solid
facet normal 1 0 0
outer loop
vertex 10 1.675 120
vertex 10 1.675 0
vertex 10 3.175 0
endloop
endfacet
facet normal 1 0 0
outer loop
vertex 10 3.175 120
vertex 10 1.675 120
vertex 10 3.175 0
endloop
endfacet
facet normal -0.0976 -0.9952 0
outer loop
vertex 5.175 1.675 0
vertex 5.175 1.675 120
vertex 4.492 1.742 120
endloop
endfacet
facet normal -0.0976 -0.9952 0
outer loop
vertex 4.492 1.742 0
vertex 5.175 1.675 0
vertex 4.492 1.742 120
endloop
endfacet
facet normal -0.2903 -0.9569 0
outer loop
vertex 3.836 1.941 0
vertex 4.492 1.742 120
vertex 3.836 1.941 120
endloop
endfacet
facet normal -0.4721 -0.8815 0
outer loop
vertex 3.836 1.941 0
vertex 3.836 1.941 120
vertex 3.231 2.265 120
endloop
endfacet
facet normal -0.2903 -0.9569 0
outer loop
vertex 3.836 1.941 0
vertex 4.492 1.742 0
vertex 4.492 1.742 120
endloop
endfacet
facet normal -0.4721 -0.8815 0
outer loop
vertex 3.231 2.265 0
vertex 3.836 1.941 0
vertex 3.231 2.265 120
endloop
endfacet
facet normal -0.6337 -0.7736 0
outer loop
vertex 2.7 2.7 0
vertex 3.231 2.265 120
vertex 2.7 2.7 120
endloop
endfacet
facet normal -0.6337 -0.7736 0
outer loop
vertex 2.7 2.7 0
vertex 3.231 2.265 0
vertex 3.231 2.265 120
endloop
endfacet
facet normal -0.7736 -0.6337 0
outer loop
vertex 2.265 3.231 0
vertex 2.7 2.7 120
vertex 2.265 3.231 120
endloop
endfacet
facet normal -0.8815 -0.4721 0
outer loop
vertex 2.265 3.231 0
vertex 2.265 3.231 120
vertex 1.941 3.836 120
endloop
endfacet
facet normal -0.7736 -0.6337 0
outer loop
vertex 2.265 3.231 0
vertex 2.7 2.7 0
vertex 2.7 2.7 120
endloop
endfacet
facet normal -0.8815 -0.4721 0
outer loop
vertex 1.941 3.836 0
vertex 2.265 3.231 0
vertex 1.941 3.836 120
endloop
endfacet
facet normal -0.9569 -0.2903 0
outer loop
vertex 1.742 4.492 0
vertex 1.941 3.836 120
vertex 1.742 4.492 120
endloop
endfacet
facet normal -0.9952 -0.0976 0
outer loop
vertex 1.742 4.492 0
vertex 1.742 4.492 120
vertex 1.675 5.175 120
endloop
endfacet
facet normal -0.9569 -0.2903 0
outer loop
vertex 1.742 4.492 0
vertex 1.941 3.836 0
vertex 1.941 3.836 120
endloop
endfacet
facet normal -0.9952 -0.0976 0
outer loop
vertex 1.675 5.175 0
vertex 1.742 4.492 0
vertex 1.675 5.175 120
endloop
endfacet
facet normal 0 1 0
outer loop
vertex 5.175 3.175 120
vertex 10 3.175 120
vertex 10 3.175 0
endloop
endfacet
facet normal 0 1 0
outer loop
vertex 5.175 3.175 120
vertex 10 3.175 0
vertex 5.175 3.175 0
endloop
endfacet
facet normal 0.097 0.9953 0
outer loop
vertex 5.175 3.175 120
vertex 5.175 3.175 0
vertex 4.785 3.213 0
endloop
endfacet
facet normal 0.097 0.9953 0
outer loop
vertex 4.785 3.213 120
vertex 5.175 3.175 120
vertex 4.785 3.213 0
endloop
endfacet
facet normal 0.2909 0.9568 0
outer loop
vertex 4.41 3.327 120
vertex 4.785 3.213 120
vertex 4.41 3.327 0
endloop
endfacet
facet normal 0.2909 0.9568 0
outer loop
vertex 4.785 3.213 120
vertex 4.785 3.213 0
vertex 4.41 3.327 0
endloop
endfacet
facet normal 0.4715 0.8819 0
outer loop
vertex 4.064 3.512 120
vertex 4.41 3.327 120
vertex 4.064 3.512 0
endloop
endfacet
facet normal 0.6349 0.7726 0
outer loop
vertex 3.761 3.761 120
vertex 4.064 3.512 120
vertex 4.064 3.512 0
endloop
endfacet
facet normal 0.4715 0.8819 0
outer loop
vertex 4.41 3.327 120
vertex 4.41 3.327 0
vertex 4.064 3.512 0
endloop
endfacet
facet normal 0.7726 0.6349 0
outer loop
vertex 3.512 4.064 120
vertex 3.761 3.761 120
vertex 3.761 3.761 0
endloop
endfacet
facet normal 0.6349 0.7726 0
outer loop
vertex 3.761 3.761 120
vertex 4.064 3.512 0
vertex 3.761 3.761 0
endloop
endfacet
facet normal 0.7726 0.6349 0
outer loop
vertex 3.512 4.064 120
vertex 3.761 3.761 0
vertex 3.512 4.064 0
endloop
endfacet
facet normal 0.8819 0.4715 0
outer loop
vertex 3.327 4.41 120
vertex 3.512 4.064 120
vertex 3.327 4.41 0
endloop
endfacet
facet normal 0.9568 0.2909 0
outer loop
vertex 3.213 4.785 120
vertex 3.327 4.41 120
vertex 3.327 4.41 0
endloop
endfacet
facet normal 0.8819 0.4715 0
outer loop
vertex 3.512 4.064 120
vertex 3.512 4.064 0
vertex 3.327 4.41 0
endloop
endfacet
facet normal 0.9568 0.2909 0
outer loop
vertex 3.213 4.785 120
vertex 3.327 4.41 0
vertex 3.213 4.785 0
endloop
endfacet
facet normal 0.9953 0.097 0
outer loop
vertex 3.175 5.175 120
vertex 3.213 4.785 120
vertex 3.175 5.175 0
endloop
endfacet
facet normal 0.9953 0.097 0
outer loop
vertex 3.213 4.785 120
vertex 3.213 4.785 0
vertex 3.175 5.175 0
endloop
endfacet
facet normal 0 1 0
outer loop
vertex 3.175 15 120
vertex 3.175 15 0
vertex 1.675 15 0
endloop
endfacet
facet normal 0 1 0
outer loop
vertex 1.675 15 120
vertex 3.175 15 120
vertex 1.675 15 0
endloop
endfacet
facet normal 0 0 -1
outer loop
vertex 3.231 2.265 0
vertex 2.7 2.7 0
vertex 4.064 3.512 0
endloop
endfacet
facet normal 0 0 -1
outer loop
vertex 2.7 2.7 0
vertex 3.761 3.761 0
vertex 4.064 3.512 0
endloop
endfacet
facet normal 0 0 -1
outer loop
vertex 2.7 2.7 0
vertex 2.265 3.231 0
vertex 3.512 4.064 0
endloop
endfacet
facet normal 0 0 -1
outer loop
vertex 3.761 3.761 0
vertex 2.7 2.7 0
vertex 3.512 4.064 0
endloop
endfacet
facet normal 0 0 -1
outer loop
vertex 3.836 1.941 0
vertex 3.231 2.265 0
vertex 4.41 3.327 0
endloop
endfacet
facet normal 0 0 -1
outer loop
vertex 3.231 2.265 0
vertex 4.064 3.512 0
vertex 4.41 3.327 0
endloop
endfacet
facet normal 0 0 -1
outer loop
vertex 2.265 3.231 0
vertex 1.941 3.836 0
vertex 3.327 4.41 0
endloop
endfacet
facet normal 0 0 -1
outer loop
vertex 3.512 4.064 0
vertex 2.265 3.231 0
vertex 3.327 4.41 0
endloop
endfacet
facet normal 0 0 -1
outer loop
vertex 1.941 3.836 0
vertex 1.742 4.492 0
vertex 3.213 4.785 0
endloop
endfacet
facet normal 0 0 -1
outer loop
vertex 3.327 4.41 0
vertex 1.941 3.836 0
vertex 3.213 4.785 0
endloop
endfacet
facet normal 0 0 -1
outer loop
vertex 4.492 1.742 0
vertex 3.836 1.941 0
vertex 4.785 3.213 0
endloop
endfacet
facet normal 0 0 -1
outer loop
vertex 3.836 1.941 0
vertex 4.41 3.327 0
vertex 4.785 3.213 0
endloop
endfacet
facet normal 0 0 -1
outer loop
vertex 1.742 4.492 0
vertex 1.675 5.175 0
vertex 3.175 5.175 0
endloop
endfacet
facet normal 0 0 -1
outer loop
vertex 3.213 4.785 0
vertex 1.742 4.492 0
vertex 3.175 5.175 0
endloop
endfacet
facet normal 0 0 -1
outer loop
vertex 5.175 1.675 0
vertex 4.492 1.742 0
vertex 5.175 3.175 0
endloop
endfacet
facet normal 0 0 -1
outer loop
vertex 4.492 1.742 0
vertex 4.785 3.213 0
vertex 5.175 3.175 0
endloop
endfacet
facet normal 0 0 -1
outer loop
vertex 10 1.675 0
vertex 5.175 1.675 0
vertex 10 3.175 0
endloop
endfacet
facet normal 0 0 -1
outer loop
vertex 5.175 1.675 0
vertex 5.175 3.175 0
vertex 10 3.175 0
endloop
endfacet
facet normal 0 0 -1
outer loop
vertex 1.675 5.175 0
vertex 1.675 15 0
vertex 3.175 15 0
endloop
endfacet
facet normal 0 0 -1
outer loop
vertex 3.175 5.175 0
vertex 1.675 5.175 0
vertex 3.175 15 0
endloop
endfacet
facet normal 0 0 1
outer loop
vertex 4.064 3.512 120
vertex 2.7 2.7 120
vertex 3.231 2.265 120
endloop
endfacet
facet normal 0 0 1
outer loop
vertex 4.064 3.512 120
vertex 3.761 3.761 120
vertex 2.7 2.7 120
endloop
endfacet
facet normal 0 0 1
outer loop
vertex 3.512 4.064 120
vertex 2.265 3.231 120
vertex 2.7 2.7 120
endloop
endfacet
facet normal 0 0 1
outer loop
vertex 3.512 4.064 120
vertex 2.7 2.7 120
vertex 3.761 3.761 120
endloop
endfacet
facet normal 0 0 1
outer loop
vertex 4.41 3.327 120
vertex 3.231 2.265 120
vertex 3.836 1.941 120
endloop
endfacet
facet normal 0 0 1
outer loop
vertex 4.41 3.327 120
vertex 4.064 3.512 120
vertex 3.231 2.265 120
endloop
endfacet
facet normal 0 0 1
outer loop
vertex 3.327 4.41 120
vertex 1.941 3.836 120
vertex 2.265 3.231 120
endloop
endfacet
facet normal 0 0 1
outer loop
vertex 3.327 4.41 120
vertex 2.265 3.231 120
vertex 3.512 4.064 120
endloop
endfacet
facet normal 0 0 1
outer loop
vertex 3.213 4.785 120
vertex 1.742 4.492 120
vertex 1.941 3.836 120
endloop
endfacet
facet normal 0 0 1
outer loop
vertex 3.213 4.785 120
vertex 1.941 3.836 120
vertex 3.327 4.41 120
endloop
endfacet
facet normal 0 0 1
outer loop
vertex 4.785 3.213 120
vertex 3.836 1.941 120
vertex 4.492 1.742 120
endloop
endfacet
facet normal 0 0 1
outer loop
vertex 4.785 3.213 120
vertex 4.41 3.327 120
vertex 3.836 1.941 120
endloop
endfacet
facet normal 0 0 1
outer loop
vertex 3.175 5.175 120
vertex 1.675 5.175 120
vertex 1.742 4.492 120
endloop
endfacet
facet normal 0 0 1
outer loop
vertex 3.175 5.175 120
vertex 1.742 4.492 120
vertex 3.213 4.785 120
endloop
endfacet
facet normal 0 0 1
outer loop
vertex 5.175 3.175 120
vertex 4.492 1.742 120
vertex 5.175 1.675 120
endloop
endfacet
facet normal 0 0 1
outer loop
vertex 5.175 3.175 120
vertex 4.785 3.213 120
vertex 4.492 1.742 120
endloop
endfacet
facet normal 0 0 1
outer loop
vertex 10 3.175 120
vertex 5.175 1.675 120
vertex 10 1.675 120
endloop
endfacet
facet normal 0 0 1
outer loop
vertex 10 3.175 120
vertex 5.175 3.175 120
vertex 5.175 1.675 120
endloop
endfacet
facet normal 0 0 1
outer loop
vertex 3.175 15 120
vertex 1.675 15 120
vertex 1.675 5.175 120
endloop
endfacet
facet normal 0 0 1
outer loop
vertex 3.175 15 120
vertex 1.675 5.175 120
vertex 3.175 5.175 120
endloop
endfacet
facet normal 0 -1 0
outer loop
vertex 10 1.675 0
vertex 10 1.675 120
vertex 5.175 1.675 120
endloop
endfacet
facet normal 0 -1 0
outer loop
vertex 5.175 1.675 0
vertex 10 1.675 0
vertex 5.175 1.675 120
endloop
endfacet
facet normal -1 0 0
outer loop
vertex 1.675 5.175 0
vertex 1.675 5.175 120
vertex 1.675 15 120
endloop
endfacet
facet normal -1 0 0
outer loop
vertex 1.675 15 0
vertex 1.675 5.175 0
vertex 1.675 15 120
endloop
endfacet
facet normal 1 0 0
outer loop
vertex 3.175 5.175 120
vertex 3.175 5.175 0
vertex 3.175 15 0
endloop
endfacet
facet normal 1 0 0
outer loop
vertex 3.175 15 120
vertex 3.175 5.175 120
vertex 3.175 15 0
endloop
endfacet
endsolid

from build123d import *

# Parameters (mm, degrees)
BOSS_EXTRUDE1_DEPTH    = 120
CONVERT_SOLID1_DEPTH   = 120
CONVERT_SOLID1_2_DEPTH = 120


# Read off the part's stored shape, not the designer's step: Convert-Solid1
with BuildPart() as part:
    # Sketch1 → Boss-Extrude1 (new body)
    with BuildSketch(Plane.XY):
        Polygon((0, 15), (0, 0), (10, 0), (10, 3.175), (3.175, 3.175), (3.175, 15), align=None)
    extrude(amount=BOSS_EXTRUDE1_DEPTH)

    # Convert-Solid1 outline → Convert-Solid1 (cut)
    with BuildSketch(Plane.XY):
        with BuildLine():
            Line((1.675, 5.175), (1.675, 15))
            Line((1.675, 15), (0, 15))
            Line((0, 15), (0, 0))
            Line((0, 0), (10, 0))
            Line((10, 0), (10, 1.675))
            Line((10, 1.675), (5.175, 1.675))
            ThreePointArc((5.175, 1.675), (2.700126266, 2.700126266), (1.675, 5.175))
        make_face()
    extrude(amount=CONVERT_SOLID1_DEPTH, mode=Mode.SUBTRACT)

    # Convert-Solid1 2 outline → Convert-Solid1 2 (add)
    with BuildSketch(Plane.XY):
        with BuildLine():
            ThreePointArc((5.175, 3.175), (3.760786438, 3.760786438), (3.175, 5.175))
            Line((3.175, 5.175), (3.175, 3.175))
            Line((3.175, 3.175), (5.175, 3.175))
        make_face()
    extrude(amount=CONVERT_SOLID1_2_DEPTH)


solid = part.part
